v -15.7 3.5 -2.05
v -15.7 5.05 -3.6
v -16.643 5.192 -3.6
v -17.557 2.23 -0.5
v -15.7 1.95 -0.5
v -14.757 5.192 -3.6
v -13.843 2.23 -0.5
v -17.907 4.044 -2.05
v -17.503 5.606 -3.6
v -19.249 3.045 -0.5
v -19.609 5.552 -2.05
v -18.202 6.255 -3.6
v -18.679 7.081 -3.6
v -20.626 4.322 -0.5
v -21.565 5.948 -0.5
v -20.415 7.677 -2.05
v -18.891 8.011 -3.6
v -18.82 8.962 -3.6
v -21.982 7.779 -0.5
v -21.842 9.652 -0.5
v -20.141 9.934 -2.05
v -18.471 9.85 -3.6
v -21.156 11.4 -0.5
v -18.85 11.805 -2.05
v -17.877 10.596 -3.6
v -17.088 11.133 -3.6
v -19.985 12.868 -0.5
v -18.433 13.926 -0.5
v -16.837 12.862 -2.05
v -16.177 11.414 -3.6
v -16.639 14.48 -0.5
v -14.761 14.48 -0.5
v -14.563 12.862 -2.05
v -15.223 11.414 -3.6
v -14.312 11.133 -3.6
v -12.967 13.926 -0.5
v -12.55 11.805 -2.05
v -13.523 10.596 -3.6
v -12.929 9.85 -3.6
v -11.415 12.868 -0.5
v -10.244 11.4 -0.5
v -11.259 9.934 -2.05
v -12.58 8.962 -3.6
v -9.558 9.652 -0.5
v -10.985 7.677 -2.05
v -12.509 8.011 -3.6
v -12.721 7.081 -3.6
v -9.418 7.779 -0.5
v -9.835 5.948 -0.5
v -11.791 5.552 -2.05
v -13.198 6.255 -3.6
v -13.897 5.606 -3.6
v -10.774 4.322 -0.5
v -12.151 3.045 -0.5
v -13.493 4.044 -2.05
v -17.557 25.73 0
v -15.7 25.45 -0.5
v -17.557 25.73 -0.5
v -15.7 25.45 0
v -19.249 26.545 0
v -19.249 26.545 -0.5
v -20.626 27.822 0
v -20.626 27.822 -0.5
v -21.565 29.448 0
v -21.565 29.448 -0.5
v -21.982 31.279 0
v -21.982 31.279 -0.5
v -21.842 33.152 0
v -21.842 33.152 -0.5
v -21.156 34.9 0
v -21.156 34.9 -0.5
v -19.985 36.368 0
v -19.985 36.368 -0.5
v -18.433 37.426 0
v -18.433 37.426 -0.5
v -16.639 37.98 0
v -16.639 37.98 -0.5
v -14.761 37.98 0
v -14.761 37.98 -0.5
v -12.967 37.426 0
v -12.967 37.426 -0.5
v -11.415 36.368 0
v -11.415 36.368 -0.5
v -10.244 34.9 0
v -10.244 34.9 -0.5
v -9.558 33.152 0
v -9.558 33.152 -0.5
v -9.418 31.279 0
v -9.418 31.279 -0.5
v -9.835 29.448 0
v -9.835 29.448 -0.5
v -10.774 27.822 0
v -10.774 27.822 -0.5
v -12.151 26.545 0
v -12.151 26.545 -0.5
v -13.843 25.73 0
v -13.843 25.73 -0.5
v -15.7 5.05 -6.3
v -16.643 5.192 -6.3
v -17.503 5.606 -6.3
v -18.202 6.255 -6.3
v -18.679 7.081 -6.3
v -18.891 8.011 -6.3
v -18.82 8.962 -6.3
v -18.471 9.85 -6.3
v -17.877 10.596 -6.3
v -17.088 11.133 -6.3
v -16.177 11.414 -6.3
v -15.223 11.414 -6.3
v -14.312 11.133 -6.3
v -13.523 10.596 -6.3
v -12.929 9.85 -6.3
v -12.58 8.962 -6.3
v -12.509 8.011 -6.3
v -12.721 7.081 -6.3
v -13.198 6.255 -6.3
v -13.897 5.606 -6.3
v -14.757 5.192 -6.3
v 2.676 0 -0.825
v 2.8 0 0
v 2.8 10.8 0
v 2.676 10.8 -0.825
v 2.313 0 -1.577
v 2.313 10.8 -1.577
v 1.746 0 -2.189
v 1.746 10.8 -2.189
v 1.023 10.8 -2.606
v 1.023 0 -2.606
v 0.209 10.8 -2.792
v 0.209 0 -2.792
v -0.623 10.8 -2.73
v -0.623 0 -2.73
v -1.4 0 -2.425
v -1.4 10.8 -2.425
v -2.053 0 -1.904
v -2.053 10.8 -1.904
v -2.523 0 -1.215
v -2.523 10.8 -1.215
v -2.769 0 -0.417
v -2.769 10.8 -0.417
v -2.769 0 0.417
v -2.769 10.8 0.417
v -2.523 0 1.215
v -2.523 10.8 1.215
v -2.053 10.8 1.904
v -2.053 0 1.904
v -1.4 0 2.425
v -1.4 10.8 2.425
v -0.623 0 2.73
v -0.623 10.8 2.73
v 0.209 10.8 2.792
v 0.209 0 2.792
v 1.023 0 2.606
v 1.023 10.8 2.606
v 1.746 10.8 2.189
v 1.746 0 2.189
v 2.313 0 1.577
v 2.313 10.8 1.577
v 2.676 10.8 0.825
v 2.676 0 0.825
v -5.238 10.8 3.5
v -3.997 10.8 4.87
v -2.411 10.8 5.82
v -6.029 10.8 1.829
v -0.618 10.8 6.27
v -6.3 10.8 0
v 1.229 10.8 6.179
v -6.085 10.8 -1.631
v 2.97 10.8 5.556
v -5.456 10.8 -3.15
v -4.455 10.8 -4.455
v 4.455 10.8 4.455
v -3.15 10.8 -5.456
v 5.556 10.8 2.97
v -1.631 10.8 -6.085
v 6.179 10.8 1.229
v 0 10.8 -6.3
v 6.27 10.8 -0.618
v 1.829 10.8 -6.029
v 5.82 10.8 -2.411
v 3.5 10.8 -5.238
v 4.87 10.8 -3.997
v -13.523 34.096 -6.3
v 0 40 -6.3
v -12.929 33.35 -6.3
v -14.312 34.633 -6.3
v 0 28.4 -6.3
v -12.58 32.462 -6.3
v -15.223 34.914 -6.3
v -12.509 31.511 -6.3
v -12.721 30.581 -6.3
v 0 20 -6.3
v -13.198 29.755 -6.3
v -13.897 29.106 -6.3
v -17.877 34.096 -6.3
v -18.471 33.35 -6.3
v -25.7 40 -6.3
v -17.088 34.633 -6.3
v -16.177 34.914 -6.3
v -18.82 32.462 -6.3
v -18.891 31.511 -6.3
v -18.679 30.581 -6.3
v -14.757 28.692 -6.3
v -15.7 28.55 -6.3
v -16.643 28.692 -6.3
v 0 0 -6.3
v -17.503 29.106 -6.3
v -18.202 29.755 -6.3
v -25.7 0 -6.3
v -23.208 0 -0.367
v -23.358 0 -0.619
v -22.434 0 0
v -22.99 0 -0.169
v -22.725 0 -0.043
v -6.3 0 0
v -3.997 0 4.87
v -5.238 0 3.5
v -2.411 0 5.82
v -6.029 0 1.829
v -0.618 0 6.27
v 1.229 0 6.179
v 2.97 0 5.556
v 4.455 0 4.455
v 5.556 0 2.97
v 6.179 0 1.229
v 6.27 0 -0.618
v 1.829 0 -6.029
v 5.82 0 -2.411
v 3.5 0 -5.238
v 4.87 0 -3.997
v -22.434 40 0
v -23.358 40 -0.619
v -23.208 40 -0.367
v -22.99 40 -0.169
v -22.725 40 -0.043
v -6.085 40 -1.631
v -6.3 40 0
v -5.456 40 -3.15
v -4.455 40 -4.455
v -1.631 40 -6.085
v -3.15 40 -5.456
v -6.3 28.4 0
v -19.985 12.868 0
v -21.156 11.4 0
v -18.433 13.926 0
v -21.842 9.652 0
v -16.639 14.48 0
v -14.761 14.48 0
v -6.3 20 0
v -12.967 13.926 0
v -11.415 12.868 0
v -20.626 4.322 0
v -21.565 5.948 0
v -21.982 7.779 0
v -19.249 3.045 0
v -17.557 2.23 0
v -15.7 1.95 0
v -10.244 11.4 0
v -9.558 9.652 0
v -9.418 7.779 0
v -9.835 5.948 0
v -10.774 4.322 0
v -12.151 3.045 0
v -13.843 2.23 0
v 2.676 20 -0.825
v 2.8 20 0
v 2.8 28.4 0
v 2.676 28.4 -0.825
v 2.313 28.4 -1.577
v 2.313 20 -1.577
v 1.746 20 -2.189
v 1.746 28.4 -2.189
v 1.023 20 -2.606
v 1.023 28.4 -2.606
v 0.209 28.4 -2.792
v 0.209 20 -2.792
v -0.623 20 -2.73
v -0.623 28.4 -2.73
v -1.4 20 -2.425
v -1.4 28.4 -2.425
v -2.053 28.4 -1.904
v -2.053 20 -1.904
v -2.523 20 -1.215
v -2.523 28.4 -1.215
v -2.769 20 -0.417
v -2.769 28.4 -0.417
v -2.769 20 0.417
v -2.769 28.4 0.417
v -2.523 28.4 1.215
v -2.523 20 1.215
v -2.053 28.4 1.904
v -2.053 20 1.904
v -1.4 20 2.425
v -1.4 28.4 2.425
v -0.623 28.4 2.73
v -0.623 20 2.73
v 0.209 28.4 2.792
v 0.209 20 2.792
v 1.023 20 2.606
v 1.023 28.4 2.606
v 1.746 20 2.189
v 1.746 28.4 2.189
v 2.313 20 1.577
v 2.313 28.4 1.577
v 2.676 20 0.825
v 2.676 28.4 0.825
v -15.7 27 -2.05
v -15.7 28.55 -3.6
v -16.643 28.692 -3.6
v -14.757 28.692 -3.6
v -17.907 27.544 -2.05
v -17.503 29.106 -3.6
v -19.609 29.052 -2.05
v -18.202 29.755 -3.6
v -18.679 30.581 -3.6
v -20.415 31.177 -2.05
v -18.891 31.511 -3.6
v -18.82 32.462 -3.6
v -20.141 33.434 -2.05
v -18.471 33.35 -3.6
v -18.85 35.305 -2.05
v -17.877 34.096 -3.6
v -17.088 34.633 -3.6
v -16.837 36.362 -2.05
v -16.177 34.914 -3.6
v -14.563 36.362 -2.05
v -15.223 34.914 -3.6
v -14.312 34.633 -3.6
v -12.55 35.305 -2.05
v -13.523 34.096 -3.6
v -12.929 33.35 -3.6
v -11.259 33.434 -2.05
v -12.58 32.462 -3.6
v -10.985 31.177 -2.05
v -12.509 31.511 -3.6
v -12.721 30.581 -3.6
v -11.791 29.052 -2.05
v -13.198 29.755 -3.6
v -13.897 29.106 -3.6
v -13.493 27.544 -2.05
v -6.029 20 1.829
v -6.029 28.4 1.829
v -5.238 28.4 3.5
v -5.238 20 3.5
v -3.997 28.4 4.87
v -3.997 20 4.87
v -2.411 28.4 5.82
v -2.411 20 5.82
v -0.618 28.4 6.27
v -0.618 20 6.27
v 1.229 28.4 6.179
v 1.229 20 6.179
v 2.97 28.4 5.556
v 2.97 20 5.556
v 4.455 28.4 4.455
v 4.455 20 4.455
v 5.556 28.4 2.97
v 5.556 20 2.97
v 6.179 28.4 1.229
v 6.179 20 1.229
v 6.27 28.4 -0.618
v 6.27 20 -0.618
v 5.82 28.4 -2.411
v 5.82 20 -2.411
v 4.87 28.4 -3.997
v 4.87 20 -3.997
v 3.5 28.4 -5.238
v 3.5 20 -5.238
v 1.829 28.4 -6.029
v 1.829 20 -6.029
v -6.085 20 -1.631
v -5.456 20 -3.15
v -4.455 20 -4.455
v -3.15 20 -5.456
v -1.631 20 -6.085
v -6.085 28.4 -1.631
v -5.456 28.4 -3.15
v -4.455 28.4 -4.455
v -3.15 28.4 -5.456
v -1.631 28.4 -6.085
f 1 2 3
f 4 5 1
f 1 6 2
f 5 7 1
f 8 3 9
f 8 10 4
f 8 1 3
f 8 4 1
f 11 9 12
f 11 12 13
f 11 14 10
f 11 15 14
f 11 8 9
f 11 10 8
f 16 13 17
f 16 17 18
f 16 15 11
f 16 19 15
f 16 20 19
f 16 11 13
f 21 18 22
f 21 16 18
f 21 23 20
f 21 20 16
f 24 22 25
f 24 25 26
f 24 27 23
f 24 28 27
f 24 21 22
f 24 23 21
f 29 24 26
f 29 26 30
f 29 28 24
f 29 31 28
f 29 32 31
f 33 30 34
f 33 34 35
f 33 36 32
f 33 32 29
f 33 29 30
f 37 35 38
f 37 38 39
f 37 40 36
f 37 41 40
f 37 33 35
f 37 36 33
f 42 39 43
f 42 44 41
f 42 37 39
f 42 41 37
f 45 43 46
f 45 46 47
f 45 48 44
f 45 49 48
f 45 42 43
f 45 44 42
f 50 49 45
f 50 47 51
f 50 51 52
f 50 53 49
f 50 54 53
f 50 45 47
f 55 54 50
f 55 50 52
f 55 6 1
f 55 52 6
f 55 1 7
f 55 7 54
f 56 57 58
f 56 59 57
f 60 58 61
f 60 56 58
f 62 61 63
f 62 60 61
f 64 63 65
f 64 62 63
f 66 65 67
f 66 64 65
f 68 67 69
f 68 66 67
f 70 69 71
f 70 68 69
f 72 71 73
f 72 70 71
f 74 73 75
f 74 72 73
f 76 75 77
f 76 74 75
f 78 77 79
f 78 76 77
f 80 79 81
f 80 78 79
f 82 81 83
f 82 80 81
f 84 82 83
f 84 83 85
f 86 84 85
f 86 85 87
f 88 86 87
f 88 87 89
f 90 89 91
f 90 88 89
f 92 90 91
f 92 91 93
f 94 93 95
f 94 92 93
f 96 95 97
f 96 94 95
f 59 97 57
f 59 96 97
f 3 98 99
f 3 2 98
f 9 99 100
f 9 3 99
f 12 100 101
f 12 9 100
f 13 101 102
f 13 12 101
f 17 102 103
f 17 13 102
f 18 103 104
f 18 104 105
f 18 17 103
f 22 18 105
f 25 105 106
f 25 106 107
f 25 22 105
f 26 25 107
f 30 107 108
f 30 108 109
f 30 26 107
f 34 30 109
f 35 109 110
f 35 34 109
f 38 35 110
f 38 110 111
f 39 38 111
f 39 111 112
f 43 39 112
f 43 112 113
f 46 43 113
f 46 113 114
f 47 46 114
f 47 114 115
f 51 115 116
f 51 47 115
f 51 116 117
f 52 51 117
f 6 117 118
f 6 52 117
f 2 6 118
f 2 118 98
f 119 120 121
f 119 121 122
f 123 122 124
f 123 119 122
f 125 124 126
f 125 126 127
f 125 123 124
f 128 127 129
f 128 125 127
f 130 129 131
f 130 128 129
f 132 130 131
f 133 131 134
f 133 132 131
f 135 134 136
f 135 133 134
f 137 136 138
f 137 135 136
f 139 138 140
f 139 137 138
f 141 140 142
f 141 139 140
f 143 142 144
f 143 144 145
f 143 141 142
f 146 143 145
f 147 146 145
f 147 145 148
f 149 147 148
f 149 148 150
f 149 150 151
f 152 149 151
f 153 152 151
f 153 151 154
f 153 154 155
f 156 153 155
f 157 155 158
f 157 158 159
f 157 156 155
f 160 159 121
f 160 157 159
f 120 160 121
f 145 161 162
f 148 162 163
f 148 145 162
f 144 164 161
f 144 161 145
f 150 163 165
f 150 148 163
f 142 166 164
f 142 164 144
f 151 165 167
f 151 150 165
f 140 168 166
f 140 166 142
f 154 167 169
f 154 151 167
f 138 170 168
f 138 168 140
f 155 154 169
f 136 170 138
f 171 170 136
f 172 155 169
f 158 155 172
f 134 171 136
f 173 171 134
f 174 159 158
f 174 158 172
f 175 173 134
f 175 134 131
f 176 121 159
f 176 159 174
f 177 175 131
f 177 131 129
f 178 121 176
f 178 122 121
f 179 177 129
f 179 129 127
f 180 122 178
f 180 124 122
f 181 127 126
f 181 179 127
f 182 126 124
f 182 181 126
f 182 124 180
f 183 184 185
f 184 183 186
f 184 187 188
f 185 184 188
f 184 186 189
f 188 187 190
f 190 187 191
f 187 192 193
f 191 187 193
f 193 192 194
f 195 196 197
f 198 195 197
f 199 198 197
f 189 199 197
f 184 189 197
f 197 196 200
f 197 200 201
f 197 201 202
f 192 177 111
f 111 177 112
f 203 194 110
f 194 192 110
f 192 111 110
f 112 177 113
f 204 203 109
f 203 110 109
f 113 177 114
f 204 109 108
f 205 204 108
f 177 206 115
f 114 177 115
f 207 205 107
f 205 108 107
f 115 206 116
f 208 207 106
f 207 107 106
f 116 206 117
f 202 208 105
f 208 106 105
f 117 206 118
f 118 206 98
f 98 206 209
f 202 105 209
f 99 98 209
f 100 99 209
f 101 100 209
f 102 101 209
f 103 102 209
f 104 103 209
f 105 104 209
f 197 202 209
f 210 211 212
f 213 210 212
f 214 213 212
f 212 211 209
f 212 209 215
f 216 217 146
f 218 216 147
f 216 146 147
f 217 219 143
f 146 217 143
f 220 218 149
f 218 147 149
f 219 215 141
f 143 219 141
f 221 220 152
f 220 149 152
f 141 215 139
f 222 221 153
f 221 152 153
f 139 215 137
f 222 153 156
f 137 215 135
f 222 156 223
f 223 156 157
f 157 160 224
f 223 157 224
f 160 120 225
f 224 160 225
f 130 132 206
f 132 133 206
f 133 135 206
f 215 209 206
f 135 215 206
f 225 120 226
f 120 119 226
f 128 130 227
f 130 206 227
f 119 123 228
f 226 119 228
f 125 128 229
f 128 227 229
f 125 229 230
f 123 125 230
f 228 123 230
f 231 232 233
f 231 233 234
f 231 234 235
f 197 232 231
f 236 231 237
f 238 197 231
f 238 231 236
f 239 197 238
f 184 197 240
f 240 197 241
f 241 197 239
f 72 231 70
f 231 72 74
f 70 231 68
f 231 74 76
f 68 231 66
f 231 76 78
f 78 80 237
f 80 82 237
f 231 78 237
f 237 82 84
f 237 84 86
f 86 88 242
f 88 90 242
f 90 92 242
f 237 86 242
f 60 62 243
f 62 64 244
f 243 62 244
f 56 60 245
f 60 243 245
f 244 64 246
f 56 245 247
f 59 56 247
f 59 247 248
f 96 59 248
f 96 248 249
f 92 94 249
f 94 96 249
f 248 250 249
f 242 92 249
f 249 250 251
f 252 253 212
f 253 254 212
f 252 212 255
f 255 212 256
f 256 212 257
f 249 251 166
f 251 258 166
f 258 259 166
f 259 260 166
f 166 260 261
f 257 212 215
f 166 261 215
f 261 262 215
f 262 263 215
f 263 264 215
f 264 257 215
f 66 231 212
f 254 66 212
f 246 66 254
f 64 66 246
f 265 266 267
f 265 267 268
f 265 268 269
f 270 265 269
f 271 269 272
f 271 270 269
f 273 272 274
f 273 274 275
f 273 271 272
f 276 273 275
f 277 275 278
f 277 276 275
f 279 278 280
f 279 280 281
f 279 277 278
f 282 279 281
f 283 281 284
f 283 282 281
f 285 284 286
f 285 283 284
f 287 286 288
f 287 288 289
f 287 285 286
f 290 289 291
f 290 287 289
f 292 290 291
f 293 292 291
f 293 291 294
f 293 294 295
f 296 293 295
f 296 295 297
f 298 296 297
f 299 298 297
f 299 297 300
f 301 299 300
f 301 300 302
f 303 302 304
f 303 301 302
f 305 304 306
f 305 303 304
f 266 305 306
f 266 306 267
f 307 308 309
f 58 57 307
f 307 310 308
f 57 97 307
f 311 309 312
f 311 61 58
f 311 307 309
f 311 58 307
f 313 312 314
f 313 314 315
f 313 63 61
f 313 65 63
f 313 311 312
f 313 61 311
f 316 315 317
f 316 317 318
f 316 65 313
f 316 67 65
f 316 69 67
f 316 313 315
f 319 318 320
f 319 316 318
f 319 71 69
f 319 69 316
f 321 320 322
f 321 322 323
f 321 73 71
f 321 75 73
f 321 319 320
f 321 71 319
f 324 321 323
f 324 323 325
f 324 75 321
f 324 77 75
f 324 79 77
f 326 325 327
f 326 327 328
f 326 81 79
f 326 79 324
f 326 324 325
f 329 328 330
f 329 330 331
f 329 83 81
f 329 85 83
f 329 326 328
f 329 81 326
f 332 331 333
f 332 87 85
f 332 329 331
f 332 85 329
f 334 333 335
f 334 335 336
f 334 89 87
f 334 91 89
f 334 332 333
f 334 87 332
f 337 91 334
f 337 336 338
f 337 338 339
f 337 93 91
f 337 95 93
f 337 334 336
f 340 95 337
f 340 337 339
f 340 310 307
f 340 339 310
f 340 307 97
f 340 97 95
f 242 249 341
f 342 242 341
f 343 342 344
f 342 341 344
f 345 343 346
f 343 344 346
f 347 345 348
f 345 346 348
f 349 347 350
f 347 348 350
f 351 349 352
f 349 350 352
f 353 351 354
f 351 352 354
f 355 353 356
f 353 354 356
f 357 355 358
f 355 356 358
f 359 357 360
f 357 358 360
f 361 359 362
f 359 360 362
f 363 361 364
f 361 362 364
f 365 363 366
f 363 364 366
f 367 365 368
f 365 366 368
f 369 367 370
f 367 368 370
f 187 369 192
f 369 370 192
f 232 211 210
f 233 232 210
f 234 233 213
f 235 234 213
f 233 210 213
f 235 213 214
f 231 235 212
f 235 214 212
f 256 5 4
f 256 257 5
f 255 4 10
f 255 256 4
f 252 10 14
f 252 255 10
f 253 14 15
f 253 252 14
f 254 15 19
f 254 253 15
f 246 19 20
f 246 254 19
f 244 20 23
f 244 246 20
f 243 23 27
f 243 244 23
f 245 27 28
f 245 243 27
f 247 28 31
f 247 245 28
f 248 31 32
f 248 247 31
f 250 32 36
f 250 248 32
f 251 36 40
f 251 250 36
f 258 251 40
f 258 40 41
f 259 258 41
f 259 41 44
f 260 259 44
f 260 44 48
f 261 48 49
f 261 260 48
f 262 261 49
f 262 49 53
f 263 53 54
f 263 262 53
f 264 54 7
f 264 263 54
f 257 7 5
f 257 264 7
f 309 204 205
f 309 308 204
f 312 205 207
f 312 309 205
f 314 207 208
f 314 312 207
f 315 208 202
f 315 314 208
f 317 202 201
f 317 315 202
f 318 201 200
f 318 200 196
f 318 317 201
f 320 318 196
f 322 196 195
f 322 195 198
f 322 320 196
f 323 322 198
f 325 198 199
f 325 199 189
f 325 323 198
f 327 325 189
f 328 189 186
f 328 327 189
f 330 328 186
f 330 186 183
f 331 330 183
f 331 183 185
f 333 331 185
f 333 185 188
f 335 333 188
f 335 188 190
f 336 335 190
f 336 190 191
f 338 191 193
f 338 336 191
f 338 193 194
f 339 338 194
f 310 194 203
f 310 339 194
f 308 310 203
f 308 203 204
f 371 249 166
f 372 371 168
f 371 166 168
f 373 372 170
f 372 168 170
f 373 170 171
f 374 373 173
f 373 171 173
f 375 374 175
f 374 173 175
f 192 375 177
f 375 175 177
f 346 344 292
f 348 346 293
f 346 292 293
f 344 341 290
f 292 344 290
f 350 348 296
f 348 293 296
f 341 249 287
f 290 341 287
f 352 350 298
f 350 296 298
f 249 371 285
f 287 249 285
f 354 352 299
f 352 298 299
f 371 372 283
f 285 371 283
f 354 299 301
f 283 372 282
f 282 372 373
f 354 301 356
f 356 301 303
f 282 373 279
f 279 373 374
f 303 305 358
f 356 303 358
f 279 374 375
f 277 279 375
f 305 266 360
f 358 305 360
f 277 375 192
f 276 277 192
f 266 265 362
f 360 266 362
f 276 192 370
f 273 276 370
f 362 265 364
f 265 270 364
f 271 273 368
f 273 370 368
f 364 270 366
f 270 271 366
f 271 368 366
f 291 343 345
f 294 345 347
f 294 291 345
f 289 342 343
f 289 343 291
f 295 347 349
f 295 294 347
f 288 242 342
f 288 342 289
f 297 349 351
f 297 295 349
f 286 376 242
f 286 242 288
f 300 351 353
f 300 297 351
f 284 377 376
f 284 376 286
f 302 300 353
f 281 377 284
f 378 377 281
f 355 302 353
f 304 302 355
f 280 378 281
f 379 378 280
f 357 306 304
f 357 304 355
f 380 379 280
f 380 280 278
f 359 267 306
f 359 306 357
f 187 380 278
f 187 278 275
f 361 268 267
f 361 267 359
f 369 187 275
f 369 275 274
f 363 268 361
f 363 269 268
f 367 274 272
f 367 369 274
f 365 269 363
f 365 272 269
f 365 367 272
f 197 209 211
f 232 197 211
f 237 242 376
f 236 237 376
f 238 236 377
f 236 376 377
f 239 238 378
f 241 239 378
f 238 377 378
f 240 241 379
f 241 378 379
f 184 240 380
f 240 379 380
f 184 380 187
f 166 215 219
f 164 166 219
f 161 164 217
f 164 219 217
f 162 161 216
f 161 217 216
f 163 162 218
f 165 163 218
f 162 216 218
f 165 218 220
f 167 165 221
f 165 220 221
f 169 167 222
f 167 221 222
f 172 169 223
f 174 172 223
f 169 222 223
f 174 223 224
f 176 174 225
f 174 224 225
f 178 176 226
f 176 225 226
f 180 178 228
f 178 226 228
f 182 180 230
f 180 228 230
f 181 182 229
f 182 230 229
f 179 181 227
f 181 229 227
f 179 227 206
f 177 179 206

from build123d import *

# Parameters (mm, degrees)
SKETCH1_R                                    = 2.8
BOSS_EXTRUDE1_DEPTH                          = 10.8
BOSS_EXTRUDE2_DEPTH                          = 40
BOSS_EXTRUDE5_START                          = 20
SKETCH1_7_R                                  = 2.8
BOSS_EXTRUDE5_DEPTH                          = 8.4
CSK_FOR_M6_COUNTERSUNK_FLAT_HEAD_SCR_2_COUNT = 2
CSK_FOR_M6_COUNTERSUNK_FLAT_HEAD_SCR_2_PITCH = 23.5


with BuildPart() as part:
    # Sketch1 → Boss-Extrude1 (new body)
    with BuildSketch(Plane(origin=(0, 0, 0), x_dir=(1, 0, 0), z_dir=(0, 1, 0))):
        with BuildLine():
            Line((-22.433809621, 0), (-6.3, 0))
            ThreePointArc((-6.3, 0), (4.454772721, -4.454772721), (0, 6.3))
            Line((0, 6.3), (-25.7, 6.3))
            Line((-25.7, 6.3), (-23.358351291, 0.618919036))
            ThreePointArc((-23.358351291, 0.618919036), (-22.990100479, 0.169012346), (-22.433809621, 0))
        make_face()
        Circle(SKETCH1_R, mode=Mode.SUBTRACT)
    extrude(amount=BOSS_EXTRUDE1_DEPTH)

    # Sketch1<3> → Boss-Extrude2 (add)
    with BuildSketch(Plane(origin=(0, 0, 0), x_dir=(1, 0, 0), z_dir=(0, 1, 0))):
        with BuildLine():
            ThreePointArc((-6.3, 0), (-4.454772721, 4.454772721), (0, 6.3))
            Line((0, 6.3), (-25.7, 6.3))
            Line((-25.7, 6.3), (-23.358351291, 0.618919036))
            ThreePointArc((-23.358351291, 0.618919036), (-22.990100479, 0.169012346), (-22.433809621, 0))
            Line((-22.433809621, 0), (-6.3, 0))
        make_face()
    extrude(amount=BOSS_EXTRUDE2_DEPTH)

    # Sketch1<7> → Boss-Extrude5 (add)
    with BuildSketch(Plane(origin=(0, 0, 0), x_dir=(1, 0, 0), z_dir=(0, 1, 0)).offset(BOSS_EXTRUDE5_START)):
        with BuildLine():
            ThreePointArc((6.3, 0), (4.454772721, 4.454772721), (0, 6.3))
            ThreePointArc((0, 6.3), (-4.454772721, 4.454772721), (-6.3, 0))
            ThreePointArc((-6.3, 0), (0, -6.3), (6.3, 0))
        make_face()
        Circle(SKETCH1_7_R, mode=Mode.SUBTRACT)
    extrude(amount=BOSS_EXTRUDE5_DEPTH)

    # Sketch3 → CSK for M6 Countersunk Flat Head Screw1 (revolve, cut)
    with BuildSketch(Plane(origin=(-15.7, 31.75, 0), x_dir=(0, -1, 0), z_dir=(1, 0, 0))):
        Polygon((0, 0), (0, 6.3), (3.2, 6.3), (3.2, 3.6), (6.3, 0.5), (6.3, 0), align=None)
    csk_for_m6_countersunk_flat_head_screw1 = revolve(axis=Axis((-15.7, 31.75, 6.35), (0, 0, -1)), mode=Mode.SUBTRACT)

    # CSK for M6 Countersunk Flat Head Scr 2: CSK for M6 Countersunk Flat Head Screw1 ×2
    with Locations(*[(0, -i * CSK_FOR_M6_COUNTERSUNK_FLAT_HEAD_SCR_2_PITCH, 0) for i in range(1, CSK_FOR_M6_COUNTERSUNK_FLAT_HEAD_SCR_2_COUNT)]):
        add(csk_for_m6_countersunk_flat_head_screw1, mode=Mode.SUBTRACT)


solid = part.part
